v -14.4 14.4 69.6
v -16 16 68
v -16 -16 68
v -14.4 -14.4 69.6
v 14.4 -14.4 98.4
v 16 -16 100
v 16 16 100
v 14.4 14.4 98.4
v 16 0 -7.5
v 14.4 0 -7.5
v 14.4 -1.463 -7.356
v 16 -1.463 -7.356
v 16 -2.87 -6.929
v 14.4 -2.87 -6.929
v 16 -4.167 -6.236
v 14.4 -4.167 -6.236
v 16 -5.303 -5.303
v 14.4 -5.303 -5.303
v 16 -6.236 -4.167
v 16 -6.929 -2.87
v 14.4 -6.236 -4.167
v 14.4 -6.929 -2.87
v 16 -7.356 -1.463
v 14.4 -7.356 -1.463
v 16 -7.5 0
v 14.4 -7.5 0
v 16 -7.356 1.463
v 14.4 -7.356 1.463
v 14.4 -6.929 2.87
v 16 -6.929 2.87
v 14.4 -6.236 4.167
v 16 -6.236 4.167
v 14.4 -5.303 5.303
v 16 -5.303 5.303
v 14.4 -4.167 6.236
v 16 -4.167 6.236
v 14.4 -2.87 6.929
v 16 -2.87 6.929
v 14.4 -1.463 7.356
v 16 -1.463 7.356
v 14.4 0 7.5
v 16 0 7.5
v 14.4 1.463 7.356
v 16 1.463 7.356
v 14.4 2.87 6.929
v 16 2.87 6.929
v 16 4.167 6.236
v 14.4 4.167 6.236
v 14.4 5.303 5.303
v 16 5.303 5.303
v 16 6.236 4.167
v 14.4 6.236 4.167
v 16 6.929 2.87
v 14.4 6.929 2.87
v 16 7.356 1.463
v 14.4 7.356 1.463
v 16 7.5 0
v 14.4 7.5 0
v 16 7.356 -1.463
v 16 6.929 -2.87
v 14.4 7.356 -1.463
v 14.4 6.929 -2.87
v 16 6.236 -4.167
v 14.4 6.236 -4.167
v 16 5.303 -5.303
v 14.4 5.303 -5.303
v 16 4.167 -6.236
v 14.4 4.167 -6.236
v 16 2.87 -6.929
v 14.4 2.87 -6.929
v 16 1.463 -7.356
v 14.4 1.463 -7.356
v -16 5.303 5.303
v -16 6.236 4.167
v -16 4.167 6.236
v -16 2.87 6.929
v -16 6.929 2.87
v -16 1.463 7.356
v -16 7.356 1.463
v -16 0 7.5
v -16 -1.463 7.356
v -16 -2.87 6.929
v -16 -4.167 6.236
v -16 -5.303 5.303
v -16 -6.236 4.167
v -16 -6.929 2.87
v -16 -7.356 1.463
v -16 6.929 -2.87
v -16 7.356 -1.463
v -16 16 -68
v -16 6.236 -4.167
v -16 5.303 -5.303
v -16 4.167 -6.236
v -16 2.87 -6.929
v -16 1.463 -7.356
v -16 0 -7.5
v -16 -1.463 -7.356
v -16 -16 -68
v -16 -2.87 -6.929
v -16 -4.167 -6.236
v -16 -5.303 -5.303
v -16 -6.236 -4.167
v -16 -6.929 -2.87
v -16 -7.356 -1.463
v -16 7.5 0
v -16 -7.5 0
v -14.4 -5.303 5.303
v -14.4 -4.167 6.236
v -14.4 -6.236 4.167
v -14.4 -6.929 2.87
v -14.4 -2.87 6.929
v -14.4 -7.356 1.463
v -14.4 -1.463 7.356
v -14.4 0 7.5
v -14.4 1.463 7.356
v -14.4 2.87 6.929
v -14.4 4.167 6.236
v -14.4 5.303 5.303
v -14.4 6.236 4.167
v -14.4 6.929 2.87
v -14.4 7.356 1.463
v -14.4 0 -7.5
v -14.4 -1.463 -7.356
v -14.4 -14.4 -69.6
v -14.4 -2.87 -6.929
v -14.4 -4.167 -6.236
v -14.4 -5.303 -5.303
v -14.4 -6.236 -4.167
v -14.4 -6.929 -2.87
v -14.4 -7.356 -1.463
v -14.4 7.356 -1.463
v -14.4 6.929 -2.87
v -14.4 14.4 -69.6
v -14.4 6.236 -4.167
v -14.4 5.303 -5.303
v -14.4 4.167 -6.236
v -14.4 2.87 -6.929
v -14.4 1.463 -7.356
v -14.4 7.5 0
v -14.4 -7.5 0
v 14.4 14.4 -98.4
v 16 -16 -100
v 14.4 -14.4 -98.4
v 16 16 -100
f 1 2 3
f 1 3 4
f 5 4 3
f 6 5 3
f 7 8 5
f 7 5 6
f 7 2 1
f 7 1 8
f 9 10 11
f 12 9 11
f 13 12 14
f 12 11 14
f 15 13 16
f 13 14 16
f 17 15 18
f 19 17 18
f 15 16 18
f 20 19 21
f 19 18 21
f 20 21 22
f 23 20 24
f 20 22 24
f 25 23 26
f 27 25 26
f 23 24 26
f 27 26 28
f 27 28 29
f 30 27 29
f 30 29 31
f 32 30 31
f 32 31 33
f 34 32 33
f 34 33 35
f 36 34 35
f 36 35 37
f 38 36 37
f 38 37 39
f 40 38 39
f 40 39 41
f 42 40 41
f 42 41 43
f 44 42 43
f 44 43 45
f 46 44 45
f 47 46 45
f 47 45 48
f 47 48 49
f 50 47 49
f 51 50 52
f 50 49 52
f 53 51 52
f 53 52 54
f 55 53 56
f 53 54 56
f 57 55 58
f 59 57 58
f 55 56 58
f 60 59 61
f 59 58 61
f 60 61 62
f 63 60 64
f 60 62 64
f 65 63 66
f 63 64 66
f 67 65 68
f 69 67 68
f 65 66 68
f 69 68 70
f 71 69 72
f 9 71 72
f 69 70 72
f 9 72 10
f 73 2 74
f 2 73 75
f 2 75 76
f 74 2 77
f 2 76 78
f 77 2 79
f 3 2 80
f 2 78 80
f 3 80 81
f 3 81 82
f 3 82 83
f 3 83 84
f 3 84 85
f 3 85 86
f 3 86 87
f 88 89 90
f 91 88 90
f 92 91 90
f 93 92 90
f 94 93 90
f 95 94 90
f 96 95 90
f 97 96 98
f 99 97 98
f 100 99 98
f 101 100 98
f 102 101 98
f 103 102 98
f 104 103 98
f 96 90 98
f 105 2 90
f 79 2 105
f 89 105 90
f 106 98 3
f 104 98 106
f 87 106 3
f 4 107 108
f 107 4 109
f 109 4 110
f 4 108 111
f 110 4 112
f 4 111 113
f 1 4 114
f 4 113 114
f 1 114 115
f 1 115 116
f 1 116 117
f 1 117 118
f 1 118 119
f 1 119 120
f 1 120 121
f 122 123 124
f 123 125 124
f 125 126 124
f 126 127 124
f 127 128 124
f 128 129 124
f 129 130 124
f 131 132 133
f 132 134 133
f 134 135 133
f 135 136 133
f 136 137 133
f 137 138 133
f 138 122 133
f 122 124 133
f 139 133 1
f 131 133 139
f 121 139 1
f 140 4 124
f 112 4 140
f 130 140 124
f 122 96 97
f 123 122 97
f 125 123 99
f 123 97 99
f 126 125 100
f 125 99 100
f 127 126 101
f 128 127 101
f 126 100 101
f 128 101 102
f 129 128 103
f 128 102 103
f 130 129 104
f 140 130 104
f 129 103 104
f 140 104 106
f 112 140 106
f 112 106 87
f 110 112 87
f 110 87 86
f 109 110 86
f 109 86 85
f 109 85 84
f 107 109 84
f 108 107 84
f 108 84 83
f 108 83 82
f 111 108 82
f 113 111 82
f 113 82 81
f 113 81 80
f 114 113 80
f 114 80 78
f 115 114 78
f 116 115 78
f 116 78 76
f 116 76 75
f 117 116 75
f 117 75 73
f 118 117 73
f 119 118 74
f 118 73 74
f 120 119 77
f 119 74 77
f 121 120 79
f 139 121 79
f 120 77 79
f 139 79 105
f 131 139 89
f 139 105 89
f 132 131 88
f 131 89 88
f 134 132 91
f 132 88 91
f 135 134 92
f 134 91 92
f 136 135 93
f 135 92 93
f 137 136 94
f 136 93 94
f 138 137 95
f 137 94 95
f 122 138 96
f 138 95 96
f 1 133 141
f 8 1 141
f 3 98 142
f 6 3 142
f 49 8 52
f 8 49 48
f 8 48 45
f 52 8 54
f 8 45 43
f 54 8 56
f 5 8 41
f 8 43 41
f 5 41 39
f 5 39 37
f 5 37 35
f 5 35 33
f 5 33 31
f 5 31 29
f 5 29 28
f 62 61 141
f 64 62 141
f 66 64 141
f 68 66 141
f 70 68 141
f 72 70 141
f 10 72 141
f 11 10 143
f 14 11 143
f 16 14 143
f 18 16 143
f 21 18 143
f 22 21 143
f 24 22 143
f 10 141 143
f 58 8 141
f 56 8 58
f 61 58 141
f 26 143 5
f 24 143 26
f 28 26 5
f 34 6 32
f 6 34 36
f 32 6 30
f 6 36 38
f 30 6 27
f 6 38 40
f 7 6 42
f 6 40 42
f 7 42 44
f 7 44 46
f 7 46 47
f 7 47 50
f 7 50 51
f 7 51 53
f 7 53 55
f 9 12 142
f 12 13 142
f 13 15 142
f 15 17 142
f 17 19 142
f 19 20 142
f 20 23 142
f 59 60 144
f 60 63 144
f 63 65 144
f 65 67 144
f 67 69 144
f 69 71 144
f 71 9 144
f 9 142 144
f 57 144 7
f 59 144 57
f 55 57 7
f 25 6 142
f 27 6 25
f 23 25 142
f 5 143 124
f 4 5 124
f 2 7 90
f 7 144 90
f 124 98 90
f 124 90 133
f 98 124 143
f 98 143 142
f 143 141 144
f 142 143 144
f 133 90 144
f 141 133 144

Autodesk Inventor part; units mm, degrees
ref_plane "YZ Plane" through (0, 0, 0) normal (1, 0, 0) x (0, 1, 0)
ref_plane "XZ Plane" through (0, 0, 0) normal (0, 1, 0) x (-1, 0, 0)
ref_plane "XY Plane" through (0, 0, 0) normal (0, 0, 1) x (1, 0, 0)
sketch "スケッチ1" plane through (0, 0, 0) normal (0, 0, 1) x (1, 0, 0)
  line L0 (-16, -16) -> (16, -16)
  line L1 (16, -16) -> (16, 16)
  line L2 (16, 16) -> (-16, 16)
  line L3 (-16, 16) -> (-16, -16)
  line L4 (-16, -16) -> (16, 16) construction
  line L5 (16, -16) -> (-16, 16) construction
  line L6 (-14.4, 14.4) -> (14.4, 14.4)
  line L7 (14.4, 14.4) -> (14.4, -14.4)
  line L8 (14.4, -14.4) -> (-14.4, -14.4)
  line L9 (-14.4, -14.4) -> (-14.4, 14.4)
  point P0 (0, 0)
  dimension "d0" = 32
  dimension "d1" = 32
  dimension "d2" = 1.6
extrude "押し出し1" add sketch "スケッチ1" along normal mid plane 200
chamfer "面取り1" distance 32 angle 45 1 edges at (-16, 0, 100)
chamfer "面取り2" distance 32 angle 45 1 edges at (-16, 0, -100)
sketch "スケッチ2" plane through (16, -16, 100) normal (1, 0, 0) x (0, 0, -1)
  point P0 (100, 16)
  point P1 (100, 16)
hole "穴1" at (16, 0, 0) direction (-1, 0, 0) diameter 15 end through all
properties part number "Pipe横"
